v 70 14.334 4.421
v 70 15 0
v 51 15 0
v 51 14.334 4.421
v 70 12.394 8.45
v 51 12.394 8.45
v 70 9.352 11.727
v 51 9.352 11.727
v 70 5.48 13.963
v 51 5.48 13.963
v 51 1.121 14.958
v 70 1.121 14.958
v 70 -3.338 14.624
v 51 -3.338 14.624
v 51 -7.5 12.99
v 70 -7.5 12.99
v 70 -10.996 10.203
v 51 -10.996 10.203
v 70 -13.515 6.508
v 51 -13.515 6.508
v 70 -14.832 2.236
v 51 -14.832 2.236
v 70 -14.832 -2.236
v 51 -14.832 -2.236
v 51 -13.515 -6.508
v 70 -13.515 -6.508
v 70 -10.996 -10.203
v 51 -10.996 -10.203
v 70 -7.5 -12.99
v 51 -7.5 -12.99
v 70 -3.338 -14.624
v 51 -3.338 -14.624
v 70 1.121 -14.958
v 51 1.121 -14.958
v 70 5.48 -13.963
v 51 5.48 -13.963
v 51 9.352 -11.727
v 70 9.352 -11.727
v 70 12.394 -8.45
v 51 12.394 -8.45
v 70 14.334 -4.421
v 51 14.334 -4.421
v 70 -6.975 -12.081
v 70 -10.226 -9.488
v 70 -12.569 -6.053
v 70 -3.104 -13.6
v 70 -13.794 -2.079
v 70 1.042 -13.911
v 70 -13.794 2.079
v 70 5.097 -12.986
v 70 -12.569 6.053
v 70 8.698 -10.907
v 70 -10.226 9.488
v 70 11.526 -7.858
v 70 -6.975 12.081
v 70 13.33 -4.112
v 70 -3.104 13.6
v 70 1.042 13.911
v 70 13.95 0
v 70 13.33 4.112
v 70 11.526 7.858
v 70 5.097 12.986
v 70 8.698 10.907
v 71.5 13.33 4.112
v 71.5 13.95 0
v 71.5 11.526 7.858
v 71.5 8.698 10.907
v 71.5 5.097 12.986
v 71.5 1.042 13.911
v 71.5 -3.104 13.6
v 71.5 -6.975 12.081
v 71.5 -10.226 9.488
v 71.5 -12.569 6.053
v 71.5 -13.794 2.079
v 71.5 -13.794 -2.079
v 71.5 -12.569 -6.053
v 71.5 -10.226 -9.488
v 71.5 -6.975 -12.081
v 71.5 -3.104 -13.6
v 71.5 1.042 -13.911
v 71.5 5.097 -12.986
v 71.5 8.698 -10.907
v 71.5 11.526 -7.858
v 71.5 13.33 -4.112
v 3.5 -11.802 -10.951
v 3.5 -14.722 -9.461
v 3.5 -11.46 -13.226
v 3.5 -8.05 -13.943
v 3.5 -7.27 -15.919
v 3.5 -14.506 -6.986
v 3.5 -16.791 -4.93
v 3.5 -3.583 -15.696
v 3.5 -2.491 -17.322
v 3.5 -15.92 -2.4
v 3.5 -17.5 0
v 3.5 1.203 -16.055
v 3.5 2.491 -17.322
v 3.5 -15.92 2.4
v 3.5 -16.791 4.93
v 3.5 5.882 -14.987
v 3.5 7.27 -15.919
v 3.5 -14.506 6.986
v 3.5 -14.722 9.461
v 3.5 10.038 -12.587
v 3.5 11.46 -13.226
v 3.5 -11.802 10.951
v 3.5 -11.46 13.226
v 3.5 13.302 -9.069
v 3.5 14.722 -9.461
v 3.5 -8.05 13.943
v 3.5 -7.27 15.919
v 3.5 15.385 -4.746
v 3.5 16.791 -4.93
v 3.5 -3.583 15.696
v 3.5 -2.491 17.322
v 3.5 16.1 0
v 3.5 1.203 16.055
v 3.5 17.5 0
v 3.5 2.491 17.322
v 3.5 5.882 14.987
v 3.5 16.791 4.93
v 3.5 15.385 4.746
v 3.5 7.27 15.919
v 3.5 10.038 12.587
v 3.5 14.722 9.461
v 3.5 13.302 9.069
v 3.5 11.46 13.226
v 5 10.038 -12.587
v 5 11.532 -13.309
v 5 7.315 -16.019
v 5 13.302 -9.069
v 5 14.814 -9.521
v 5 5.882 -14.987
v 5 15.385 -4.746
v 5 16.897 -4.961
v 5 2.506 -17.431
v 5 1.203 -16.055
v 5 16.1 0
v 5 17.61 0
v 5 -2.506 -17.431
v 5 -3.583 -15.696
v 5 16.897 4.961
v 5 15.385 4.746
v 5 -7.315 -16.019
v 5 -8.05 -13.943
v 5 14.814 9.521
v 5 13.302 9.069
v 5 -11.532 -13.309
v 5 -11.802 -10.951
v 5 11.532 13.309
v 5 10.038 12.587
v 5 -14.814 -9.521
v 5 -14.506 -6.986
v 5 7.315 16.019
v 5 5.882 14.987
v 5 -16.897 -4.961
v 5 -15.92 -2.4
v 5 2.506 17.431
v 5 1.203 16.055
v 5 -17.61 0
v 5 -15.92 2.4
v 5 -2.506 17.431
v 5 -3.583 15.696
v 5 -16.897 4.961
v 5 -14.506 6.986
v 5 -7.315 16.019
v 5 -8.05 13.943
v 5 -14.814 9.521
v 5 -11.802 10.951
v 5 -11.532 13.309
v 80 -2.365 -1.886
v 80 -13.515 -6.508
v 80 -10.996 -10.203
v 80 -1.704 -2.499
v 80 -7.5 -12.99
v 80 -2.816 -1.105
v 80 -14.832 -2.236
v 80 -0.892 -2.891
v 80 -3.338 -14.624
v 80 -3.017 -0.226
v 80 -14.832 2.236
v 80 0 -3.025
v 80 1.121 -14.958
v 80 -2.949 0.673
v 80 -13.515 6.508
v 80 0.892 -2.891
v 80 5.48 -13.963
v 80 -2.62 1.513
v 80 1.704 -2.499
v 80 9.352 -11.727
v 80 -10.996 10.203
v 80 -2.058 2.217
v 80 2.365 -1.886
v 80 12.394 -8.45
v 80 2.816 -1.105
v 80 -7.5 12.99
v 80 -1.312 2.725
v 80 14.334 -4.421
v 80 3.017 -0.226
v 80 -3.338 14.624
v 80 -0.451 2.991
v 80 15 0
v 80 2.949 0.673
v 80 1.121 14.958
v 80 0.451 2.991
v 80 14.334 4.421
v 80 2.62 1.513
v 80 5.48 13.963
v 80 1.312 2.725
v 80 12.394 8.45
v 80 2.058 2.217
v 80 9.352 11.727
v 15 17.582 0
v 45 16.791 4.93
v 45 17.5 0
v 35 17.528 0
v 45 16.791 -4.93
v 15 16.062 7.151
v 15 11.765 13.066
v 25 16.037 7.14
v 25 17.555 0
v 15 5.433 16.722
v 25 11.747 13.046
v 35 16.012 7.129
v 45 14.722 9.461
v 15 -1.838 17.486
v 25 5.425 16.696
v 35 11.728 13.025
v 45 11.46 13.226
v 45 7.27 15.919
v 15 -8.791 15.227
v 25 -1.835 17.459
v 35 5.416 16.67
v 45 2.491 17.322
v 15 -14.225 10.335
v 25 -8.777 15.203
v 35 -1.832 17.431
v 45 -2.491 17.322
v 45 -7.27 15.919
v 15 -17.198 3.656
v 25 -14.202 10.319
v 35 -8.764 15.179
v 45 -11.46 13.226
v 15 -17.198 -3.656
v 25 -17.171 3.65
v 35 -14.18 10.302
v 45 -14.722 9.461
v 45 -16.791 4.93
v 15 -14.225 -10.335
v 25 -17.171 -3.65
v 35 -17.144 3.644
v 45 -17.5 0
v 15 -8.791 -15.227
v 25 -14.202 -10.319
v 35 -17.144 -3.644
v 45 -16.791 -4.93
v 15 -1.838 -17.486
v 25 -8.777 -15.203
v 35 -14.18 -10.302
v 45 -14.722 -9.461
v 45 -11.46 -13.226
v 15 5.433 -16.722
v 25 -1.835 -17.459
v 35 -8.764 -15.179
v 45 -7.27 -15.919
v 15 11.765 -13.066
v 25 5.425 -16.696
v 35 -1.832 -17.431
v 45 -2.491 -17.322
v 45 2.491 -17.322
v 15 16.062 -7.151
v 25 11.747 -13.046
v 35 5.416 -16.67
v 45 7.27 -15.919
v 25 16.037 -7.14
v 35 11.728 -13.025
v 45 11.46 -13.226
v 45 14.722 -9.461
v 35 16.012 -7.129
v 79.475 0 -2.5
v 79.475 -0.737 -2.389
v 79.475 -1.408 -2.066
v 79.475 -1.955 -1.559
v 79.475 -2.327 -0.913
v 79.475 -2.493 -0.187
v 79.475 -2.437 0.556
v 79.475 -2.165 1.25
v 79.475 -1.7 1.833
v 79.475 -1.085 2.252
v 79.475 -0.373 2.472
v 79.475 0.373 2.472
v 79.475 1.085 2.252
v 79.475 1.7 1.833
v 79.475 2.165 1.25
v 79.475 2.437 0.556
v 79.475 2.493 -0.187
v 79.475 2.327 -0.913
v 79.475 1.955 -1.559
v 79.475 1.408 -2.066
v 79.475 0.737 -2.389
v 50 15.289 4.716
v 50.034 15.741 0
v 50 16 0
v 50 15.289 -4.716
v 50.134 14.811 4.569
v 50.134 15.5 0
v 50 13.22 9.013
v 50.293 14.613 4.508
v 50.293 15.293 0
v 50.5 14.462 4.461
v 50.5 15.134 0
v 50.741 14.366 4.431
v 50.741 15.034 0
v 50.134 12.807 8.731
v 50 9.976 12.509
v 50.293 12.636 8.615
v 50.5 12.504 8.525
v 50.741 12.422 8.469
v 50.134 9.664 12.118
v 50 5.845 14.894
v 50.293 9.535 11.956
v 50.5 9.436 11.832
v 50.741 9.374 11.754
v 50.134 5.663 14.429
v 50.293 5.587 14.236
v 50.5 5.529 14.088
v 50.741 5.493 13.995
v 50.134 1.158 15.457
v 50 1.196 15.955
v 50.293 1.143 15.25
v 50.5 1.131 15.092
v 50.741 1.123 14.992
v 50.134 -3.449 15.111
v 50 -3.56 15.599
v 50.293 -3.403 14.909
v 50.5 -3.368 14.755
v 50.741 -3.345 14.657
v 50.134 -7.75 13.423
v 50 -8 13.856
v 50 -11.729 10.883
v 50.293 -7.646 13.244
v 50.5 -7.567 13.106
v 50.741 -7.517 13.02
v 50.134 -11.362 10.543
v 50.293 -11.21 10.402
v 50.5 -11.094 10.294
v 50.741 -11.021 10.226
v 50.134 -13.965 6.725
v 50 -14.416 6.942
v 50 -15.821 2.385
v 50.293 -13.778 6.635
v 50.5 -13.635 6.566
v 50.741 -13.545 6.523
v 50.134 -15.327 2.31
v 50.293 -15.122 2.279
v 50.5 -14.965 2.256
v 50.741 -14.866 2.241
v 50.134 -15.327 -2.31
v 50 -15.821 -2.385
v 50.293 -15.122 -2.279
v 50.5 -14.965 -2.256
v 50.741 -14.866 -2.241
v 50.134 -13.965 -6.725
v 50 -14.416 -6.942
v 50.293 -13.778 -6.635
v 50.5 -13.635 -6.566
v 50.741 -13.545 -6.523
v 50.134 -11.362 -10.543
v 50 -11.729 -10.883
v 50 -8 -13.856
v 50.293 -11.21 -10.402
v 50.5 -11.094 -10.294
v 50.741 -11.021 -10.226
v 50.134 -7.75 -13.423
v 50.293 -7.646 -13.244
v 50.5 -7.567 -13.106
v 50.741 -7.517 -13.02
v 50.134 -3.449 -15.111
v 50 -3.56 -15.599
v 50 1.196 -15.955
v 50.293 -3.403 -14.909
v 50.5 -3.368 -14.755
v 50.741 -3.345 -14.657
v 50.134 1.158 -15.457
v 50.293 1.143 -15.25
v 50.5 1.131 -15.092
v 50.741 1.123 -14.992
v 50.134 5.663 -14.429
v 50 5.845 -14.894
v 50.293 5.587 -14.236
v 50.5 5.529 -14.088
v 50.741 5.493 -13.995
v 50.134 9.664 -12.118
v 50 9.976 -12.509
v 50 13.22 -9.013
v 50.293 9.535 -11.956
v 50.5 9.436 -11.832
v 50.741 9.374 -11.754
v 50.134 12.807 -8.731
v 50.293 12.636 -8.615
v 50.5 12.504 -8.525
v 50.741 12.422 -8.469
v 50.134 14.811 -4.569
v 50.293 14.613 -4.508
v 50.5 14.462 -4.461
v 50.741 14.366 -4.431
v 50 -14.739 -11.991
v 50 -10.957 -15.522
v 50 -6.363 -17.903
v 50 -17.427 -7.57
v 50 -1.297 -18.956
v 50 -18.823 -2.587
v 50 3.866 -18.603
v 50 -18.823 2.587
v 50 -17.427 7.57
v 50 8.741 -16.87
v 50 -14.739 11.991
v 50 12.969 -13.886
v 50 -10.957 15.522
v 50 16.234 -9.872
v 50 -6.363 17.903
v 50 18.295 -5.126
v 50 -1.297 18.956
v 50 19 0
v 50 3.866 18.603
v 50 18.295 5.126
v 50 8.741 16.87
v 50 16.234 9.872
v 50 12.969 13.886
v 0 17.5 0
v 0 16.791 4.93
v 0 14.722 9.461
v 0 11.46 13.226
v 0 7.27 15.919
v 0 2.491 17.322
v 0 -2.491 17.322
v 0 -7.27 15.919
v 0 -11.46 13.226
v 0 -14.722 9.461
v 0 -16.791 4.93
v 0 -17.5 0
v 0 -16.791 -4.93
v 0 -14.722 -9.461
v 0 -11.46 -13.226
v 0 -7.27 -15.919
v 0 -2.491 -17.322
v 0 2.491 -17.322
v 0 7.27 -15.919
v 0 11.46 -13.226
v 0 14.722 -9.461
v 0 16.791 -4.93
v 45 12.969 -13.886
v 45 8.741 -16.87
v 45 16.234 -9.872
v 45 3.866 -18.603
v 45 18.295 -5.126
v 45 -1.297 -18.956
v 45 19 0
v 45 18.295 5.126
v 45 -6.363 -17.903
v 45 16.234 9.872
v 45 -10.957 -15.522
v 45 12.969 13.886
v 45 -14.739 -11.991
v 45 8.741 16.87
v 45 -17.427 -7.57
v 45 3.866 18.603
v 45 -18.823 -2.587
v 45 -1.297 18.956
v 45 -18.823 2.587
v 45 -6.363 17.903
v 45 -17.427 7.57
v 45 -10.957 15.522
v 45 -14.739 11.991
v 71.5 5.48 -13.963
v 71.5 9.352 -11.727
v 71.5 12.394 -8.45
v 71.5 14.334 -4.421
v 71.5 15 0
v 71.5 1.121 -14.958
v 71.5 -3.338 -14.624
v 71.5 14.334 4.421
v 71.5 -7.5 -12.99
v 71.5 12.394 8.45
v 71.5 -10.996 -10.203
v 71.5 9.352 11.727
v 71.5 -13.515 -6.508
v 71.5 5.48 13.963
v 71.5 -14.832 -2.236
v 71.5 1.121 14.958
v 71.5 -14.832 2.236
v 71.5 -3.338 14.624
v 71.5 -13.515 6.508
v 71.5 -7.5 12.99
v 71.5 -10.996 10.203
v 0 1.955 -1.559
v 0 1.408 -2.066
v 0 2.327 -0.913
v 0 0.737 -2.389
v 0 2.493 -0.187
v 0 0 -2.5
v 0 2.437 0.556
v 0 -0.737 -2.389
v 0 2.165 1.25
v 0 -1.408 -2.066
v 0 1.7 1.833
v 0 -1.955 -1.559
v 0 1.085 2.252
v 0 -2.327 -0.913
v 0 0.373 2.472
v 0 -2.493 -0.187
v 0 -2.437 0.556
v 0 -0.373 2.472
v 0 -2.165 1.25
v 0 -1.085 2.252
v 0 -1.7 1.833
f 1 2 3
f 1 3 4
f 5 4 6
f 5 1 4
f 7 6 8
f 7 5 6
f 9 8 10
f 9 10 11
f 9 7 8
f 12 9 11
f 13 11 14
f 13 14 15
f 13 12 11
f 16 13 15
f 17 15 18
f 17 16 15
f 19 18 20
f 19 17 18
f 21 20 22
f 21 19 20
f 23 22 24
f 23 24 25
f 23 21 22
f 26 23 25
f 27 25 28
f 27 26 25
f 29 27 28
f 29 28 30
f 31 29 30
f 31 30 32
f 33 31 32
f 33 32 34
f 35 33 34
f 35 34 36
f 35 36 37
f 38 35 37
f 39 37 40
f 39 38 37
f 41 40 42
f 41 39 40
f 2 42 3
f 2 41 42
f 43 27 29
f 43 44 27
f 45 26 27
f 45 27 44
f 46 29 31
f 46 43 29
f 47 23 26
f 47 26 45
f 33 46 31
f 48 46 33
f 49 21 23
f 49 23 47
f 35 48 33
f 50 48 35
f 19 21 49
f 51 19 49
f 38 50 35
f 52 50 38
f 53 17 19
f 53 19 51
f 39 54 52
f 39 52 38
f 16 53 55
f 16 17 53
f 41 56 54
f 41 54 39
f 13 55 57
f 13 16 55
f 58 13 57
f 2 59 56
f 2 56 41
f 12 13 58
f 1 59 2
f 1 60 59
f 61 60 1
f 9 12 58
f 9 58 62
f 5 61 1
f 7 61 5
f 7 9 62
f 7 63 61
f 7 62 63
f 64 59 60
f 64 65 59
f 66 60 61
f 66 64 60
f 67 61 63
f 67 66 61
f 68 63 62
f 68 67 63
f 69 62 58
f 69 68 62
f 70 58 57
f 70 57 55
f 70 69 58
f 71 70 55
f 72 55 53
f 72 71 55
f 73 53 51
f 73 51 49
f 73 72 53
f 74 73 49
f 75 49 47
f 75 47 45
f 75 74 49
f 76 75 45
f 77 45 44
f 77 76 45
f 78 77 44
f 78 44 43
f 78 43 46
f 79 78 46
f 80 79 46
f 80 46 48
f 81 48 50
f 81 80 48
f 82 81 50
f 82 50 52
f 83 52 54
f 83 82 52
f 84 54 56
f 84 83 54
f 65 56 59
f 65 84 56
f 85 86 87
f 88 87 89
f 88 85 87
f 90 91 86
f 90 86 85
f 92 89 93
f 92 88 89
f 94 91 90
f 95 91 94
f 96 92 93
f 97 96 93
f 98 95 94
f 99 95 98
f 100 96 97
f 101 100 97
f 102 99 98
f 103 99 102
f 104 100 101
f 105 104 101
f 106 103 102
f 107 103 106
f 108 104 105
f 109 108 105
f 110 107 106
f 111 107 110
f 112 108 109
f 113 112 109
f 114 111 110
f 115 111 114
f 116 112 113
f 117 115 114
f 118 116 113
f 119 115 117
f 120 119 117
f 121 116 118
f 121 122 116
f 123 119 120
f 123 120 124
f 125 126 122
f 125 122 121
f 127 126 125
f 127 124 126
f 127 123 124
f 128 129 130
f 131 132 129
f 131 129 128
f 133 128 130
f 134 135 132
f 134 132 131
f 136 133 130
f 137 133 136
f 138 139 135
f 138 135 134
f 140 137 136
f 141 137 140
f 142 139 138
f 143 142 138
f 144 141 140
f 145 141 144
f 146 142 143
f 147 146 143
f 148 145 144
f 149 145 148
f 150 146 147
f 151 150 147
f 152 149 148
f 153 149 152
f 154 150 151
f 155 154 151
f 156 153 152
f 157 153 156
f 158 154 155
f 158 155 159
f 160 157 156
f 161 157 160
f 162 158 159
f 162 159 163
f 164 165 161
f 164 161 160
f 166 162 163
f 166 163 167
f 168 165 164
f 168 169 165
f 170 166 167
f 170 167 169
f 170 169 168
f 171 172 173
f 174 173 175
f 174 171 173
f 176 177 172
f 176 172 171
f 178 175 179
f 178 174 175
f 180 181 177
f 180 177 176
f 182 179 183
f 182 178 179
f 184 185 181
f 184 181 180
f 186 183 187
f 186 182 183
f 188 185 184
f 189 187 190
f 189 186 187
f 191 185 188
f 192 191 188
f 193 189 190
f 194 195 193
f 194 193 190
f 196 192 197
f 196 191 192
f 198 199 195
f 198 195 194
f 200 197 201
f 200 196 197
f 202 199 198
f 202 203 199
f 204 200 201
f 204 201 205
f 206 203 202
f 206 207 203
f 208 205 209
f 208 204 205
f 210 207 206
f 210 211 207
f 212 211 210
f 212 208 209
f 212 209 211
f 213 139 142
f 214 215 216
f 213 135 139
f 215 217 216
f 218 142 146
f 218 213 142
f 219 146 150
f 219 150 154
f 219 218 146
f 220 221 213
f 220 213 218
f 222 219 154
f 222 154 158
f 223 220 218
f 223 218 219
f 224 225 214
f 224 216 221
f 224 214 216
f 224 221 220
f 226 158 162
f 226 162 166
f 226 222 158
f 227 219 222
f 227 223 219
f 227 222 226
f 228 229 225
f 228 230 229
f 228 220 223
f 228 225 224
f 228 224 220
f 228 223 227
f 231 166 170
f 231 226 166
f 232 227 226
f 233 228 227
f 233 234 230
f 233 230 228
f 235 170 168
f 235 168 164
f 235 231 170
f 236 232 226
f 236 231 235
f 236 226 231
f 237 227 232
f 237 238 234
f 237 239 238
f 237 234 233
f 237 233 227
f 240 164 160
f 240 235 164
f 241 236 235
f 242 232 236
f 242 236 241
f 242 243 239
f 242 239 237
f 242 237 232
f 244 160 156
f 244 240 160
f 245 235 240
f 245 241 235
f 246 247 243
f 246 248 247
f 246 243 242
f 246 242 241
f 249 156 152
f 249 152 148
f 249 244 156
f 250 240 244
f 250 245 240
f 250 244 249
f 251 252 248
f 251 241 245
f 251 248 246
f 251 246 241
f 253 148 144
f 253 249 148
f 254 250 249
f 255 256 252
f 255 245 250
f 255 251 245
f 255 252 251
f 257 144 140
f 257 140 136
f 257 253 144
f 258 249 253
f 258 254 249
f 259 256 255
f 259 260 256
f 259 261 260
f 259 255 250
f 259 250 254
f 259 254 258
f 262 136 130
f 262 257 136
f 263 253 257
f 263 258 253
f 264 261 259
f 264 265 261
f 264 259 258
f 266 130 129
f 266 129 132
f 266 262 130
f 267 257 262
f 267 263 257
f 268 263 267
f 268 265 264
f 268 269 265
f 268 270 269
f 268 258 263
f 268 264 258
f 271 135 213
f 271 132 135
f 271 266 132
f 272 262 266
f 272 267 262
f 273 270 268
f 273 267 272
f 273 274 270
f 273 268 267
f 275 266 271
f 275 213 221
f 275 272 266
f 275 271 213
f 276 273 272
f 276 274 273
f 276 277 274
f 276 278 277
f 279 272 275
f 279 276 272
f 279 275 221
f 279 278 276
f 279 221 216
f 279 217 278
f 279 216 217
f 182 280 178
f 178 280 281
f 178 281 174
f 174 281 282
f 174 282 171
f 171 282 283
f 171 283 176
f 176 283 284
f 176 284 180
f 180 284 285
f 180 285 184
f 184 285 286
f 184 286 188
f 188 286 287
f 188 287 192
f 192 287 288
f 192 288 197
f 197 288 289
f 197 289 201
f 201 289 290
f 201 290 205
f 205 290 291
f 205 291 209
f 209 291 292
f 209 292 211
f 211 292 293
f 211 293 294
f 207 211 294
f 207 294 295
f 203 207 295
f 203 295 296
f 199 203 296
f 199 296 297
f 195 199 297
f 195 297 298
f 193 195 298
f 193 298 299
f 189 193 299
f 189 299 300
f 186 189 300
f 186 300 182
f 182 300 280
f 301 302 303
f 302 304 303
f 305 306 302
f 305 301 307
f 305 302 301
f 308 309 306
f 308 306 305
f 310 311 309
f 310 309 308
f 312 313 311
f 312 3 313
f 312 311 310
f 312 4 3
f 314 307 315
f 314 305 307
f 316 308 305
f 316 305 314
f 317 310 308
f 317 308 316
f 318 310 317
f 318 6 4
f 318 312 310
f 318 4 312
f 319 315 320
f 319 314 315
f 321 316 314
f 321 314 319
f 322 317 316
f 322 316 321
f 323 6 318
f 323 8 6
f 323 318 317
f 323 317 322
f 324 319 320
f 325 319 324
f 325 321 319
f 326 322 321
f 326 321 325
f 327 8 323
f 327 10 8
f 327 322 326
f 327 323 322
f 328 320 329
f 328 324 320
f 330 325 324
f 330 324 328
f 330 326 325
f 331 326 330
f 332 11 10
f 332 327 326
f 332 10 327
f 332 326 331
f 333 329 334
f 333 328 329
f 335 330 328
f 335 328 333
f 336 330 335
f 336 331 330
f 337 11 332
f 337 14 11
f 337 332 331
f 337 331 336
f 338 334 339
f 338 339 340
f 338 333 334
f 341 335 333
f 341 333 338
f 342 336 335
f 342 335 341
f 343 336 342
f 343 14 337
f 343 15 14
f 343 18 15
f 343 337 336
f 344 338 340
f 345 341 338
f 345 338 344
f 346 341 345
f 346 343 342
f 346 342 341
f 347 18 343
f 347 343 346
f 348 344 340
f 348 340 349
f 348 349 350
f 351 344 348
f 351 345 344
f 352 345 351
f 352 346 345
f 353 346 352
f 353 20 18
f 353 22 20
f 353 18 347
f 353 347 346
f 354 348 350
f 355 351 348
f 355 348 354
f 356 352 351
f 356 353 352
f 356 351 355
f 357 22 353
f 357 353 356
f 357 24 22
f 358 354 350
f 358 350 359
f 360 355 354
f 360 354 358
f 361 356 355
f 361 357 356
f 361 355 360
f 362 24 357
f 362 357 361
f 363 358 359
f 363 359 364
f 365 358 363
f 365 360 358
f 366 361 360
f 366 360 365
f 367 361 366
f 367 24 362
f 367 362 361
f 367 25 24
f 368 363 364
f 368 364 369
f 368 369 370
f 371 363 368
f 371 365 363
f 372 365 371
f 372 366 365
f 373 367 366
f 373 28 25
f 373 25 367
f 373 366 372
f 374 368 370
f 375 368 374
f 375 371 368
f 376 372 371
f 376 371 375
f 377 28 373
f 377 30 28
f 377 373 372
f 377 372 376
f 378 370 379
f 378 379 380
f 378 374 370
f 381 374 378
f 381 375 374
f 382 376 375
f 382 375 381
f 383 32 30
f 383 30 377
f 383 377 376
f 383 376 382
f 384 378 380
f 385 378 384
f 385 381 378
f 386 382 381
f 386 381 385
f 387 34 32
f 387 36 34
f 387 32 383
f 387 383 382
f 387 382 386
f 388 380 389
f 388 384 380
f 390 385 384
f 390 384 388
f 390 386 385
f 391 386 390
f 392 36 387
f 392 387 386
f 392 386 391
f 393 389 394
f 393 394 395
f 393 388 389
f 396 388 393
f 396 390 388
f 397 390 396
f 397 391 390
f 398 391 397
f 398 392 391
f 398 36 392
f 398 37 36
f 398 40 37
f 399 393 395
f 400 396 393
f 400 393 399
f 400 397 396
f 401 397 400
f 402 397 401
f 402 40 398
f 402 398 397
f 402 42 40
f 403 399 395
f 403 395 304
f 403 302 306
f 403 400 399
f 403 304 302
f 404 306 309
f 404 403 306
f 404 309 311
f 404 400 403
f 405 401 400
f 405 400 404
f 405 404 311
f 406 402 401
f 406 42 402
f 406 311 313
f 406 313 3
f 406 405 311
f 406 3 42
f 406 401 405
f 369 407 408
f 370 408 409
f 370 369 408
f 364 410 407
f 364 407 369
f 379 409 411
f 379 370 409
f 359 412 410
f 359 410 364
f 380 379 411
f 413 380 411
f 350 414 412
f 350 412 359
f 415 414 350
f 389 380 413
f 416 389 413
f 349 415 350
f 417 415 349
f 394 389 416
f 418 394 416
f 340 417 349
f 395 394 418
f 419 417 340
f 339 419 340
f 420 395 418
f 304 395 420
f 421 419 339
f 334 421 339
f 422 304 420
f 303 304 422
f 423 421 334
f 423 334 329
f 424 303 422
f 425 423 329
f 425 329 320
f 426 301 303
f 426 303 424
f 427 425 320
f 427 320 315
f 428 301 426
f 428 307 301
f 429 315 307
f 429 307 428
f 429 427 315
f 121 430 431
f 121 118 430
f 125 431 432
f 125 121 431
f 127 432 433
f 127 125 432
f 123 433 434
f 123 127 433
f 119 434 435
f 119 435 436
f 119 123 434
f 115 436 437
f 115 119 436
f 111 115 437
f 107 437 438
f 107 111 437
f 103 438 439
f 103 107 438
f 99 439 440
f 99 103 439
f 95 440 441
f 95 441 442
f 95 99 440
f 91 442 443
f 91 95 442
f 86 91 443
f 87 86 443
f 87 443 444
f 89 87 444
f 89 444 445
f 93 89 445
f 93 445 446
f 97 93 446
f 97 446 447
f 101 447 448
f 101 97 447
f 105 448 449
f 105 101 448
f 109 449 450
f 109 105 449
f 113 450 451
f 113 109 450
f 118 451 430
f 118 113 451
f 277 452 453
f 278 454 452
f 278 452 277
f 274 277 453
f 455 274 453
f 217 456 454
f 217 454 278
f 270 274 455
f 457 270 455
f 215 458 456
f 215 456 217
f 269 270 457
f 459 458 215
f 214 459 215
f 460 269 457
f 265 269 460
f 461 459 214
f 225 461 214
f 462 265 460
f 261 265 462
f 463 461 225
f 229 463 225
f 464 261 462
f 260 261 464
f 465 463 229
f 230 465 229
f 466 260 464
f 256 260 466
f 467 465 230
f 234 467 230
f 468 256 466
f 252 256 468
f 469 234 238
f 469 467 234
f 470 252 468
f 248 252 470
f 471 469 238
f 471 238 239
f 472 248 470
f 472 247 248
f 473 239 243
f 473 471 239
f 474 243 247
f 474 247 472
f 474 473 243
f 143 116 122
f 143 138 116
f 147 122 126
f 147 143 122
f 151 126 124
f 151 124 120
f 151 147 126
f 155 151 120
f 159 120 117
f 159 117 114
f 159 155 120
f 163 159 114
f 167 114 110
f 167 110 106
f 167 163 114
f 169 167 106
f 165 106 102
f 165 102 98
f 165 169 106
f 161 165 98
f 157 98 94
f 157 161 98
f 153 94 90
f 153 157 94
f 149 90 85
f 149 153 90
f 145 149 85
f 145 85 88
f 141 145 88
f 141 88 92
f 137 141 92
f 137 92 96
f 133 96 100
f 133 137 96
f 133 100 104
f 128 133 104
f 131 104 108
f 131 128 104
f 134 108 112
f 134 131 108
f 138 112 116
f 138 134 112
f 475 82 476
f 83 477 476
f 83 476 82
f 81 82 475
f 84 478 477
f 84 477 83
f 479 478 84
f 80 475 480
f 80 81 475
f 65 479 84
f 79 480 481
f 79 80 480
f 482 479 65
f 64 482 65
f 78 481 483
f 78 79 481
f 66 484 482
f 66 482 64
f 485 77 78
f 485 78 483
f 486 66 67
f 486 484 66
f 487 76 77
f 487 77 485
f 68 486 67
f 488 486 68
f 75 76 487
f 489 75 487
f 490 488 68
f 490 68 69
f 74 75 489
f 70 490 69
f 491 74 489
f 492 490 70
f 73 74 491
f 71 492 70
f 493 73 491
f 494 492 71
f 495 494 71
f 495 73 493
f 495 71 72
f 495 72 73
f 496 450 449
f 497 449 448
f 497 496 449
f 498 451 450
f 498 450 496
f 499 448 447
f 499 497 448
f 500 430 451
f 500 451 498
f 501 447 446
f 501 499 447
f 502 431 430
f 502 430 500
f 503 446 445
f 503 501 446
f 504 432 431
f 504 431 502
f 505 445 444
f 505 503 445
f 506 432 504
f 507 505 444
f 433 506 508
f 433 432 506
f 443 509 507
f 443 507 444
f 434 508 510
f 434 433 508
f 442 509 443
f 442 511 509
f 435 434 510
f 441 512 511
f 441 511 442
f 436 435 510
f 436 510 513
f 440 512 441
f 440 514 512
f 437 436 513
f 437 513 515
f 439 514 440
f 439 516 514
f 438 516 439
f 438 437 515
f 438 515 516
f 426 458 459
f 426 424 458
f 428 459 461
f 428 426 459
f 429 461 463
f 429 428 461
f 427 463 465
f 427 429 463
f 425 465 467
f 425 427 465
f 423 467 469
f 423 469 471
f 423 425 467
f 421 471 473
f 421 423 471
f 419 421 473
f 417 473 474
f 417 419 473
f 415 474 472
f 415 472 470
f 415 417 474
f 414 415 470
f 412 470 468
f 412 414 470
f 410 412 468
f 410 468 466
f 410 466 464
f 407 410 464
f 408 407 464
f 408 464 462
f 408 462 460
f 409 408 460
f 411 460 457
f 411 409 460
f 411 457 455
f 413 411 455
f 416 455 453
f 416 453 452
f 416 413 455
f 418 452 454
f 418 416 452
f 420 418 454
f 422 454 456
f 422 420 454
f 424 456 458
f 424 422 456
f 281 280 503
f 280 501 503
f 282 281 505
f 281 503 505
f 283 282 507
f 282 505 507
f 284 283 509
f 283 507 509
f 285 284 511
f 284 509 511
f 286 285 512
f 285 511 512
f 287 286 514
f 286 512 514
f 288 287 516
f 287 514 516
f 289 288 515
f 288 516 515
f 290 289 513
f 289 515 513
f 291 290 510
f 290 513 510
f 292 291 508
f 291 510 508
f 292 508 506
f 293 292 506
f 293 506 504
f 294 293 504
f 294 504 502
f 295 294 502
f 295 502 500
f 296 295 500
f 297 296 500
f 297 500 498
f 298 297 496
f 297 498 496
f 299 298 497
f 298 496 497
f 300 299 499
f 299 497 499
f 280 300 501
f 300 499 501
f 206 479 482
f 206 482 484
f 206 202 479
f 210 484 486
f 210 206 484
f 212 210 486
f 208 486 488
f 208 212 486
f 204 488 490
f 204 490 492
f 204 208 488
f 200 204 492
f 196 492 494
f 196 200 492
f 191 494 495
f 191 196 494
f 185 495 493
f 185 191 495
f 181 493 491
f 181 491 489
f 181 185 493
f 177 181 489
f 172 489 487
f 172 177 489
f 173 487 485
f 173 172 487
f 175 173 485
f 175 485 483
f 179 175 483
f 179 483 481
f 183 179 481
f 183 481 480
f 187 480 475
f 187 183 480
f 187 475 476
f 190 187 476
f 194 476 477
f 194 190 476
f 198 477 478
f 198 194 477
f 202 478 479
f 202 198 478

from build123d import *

# Parameters (mm, degrees)
FILLET1_R                   = 1
M6_TAPPED_HOLE1_D           = 5
M6_TAPPED_HOLE1_CSINK_D     = 6.05
M6_TAPPED_HOLE1_CSINK_ANGLE = 90


# Read off the part's stored shape, not the designer's step: Revolve1
with BuildPart() as part:
    # Revolve1 outline → Revolve1 (revolve)
    with BuildSketch(Plane.YX):
        Polygon((0, 80), (0, 0), (17.5, 0), (17.5, 3.5), (16.1, 3.5), (16.1, 5), (17.61, 5), (17.5, 45), (19, 45), (19, 50), (15, 50), (15, 70), (13.95, 70), (13.95, 71.5), (15, 71.5), (15, 80), align=None)
    revolve(axis=Axis((0, 0, 0), (1, 0, 0)))

    # Fillet1
    fillet1_edges = [part.edges().sort_by_distance(p)[0] for p in [
        (50, -15, 0),
    ]]
    fillet(fillet1_edges, radius=FILLET1_R)

    # M6 Tapped Hole1 (through all)
    with Locations(Plane(origin=(80, 0, 0), x_dir=(0, 0, 1), z_dir=(1, 0, 0))):
        with Locations((0, 0)):
            CounterSinkHole(M6_TAPPED_HOLE1_D / 2, M6_TAPPED_HOLE1_CSINK_D / 2, counter_sink_angle=M6_TAPPED_HOLE1_CSINK_ANGLE)


solid = part.part
